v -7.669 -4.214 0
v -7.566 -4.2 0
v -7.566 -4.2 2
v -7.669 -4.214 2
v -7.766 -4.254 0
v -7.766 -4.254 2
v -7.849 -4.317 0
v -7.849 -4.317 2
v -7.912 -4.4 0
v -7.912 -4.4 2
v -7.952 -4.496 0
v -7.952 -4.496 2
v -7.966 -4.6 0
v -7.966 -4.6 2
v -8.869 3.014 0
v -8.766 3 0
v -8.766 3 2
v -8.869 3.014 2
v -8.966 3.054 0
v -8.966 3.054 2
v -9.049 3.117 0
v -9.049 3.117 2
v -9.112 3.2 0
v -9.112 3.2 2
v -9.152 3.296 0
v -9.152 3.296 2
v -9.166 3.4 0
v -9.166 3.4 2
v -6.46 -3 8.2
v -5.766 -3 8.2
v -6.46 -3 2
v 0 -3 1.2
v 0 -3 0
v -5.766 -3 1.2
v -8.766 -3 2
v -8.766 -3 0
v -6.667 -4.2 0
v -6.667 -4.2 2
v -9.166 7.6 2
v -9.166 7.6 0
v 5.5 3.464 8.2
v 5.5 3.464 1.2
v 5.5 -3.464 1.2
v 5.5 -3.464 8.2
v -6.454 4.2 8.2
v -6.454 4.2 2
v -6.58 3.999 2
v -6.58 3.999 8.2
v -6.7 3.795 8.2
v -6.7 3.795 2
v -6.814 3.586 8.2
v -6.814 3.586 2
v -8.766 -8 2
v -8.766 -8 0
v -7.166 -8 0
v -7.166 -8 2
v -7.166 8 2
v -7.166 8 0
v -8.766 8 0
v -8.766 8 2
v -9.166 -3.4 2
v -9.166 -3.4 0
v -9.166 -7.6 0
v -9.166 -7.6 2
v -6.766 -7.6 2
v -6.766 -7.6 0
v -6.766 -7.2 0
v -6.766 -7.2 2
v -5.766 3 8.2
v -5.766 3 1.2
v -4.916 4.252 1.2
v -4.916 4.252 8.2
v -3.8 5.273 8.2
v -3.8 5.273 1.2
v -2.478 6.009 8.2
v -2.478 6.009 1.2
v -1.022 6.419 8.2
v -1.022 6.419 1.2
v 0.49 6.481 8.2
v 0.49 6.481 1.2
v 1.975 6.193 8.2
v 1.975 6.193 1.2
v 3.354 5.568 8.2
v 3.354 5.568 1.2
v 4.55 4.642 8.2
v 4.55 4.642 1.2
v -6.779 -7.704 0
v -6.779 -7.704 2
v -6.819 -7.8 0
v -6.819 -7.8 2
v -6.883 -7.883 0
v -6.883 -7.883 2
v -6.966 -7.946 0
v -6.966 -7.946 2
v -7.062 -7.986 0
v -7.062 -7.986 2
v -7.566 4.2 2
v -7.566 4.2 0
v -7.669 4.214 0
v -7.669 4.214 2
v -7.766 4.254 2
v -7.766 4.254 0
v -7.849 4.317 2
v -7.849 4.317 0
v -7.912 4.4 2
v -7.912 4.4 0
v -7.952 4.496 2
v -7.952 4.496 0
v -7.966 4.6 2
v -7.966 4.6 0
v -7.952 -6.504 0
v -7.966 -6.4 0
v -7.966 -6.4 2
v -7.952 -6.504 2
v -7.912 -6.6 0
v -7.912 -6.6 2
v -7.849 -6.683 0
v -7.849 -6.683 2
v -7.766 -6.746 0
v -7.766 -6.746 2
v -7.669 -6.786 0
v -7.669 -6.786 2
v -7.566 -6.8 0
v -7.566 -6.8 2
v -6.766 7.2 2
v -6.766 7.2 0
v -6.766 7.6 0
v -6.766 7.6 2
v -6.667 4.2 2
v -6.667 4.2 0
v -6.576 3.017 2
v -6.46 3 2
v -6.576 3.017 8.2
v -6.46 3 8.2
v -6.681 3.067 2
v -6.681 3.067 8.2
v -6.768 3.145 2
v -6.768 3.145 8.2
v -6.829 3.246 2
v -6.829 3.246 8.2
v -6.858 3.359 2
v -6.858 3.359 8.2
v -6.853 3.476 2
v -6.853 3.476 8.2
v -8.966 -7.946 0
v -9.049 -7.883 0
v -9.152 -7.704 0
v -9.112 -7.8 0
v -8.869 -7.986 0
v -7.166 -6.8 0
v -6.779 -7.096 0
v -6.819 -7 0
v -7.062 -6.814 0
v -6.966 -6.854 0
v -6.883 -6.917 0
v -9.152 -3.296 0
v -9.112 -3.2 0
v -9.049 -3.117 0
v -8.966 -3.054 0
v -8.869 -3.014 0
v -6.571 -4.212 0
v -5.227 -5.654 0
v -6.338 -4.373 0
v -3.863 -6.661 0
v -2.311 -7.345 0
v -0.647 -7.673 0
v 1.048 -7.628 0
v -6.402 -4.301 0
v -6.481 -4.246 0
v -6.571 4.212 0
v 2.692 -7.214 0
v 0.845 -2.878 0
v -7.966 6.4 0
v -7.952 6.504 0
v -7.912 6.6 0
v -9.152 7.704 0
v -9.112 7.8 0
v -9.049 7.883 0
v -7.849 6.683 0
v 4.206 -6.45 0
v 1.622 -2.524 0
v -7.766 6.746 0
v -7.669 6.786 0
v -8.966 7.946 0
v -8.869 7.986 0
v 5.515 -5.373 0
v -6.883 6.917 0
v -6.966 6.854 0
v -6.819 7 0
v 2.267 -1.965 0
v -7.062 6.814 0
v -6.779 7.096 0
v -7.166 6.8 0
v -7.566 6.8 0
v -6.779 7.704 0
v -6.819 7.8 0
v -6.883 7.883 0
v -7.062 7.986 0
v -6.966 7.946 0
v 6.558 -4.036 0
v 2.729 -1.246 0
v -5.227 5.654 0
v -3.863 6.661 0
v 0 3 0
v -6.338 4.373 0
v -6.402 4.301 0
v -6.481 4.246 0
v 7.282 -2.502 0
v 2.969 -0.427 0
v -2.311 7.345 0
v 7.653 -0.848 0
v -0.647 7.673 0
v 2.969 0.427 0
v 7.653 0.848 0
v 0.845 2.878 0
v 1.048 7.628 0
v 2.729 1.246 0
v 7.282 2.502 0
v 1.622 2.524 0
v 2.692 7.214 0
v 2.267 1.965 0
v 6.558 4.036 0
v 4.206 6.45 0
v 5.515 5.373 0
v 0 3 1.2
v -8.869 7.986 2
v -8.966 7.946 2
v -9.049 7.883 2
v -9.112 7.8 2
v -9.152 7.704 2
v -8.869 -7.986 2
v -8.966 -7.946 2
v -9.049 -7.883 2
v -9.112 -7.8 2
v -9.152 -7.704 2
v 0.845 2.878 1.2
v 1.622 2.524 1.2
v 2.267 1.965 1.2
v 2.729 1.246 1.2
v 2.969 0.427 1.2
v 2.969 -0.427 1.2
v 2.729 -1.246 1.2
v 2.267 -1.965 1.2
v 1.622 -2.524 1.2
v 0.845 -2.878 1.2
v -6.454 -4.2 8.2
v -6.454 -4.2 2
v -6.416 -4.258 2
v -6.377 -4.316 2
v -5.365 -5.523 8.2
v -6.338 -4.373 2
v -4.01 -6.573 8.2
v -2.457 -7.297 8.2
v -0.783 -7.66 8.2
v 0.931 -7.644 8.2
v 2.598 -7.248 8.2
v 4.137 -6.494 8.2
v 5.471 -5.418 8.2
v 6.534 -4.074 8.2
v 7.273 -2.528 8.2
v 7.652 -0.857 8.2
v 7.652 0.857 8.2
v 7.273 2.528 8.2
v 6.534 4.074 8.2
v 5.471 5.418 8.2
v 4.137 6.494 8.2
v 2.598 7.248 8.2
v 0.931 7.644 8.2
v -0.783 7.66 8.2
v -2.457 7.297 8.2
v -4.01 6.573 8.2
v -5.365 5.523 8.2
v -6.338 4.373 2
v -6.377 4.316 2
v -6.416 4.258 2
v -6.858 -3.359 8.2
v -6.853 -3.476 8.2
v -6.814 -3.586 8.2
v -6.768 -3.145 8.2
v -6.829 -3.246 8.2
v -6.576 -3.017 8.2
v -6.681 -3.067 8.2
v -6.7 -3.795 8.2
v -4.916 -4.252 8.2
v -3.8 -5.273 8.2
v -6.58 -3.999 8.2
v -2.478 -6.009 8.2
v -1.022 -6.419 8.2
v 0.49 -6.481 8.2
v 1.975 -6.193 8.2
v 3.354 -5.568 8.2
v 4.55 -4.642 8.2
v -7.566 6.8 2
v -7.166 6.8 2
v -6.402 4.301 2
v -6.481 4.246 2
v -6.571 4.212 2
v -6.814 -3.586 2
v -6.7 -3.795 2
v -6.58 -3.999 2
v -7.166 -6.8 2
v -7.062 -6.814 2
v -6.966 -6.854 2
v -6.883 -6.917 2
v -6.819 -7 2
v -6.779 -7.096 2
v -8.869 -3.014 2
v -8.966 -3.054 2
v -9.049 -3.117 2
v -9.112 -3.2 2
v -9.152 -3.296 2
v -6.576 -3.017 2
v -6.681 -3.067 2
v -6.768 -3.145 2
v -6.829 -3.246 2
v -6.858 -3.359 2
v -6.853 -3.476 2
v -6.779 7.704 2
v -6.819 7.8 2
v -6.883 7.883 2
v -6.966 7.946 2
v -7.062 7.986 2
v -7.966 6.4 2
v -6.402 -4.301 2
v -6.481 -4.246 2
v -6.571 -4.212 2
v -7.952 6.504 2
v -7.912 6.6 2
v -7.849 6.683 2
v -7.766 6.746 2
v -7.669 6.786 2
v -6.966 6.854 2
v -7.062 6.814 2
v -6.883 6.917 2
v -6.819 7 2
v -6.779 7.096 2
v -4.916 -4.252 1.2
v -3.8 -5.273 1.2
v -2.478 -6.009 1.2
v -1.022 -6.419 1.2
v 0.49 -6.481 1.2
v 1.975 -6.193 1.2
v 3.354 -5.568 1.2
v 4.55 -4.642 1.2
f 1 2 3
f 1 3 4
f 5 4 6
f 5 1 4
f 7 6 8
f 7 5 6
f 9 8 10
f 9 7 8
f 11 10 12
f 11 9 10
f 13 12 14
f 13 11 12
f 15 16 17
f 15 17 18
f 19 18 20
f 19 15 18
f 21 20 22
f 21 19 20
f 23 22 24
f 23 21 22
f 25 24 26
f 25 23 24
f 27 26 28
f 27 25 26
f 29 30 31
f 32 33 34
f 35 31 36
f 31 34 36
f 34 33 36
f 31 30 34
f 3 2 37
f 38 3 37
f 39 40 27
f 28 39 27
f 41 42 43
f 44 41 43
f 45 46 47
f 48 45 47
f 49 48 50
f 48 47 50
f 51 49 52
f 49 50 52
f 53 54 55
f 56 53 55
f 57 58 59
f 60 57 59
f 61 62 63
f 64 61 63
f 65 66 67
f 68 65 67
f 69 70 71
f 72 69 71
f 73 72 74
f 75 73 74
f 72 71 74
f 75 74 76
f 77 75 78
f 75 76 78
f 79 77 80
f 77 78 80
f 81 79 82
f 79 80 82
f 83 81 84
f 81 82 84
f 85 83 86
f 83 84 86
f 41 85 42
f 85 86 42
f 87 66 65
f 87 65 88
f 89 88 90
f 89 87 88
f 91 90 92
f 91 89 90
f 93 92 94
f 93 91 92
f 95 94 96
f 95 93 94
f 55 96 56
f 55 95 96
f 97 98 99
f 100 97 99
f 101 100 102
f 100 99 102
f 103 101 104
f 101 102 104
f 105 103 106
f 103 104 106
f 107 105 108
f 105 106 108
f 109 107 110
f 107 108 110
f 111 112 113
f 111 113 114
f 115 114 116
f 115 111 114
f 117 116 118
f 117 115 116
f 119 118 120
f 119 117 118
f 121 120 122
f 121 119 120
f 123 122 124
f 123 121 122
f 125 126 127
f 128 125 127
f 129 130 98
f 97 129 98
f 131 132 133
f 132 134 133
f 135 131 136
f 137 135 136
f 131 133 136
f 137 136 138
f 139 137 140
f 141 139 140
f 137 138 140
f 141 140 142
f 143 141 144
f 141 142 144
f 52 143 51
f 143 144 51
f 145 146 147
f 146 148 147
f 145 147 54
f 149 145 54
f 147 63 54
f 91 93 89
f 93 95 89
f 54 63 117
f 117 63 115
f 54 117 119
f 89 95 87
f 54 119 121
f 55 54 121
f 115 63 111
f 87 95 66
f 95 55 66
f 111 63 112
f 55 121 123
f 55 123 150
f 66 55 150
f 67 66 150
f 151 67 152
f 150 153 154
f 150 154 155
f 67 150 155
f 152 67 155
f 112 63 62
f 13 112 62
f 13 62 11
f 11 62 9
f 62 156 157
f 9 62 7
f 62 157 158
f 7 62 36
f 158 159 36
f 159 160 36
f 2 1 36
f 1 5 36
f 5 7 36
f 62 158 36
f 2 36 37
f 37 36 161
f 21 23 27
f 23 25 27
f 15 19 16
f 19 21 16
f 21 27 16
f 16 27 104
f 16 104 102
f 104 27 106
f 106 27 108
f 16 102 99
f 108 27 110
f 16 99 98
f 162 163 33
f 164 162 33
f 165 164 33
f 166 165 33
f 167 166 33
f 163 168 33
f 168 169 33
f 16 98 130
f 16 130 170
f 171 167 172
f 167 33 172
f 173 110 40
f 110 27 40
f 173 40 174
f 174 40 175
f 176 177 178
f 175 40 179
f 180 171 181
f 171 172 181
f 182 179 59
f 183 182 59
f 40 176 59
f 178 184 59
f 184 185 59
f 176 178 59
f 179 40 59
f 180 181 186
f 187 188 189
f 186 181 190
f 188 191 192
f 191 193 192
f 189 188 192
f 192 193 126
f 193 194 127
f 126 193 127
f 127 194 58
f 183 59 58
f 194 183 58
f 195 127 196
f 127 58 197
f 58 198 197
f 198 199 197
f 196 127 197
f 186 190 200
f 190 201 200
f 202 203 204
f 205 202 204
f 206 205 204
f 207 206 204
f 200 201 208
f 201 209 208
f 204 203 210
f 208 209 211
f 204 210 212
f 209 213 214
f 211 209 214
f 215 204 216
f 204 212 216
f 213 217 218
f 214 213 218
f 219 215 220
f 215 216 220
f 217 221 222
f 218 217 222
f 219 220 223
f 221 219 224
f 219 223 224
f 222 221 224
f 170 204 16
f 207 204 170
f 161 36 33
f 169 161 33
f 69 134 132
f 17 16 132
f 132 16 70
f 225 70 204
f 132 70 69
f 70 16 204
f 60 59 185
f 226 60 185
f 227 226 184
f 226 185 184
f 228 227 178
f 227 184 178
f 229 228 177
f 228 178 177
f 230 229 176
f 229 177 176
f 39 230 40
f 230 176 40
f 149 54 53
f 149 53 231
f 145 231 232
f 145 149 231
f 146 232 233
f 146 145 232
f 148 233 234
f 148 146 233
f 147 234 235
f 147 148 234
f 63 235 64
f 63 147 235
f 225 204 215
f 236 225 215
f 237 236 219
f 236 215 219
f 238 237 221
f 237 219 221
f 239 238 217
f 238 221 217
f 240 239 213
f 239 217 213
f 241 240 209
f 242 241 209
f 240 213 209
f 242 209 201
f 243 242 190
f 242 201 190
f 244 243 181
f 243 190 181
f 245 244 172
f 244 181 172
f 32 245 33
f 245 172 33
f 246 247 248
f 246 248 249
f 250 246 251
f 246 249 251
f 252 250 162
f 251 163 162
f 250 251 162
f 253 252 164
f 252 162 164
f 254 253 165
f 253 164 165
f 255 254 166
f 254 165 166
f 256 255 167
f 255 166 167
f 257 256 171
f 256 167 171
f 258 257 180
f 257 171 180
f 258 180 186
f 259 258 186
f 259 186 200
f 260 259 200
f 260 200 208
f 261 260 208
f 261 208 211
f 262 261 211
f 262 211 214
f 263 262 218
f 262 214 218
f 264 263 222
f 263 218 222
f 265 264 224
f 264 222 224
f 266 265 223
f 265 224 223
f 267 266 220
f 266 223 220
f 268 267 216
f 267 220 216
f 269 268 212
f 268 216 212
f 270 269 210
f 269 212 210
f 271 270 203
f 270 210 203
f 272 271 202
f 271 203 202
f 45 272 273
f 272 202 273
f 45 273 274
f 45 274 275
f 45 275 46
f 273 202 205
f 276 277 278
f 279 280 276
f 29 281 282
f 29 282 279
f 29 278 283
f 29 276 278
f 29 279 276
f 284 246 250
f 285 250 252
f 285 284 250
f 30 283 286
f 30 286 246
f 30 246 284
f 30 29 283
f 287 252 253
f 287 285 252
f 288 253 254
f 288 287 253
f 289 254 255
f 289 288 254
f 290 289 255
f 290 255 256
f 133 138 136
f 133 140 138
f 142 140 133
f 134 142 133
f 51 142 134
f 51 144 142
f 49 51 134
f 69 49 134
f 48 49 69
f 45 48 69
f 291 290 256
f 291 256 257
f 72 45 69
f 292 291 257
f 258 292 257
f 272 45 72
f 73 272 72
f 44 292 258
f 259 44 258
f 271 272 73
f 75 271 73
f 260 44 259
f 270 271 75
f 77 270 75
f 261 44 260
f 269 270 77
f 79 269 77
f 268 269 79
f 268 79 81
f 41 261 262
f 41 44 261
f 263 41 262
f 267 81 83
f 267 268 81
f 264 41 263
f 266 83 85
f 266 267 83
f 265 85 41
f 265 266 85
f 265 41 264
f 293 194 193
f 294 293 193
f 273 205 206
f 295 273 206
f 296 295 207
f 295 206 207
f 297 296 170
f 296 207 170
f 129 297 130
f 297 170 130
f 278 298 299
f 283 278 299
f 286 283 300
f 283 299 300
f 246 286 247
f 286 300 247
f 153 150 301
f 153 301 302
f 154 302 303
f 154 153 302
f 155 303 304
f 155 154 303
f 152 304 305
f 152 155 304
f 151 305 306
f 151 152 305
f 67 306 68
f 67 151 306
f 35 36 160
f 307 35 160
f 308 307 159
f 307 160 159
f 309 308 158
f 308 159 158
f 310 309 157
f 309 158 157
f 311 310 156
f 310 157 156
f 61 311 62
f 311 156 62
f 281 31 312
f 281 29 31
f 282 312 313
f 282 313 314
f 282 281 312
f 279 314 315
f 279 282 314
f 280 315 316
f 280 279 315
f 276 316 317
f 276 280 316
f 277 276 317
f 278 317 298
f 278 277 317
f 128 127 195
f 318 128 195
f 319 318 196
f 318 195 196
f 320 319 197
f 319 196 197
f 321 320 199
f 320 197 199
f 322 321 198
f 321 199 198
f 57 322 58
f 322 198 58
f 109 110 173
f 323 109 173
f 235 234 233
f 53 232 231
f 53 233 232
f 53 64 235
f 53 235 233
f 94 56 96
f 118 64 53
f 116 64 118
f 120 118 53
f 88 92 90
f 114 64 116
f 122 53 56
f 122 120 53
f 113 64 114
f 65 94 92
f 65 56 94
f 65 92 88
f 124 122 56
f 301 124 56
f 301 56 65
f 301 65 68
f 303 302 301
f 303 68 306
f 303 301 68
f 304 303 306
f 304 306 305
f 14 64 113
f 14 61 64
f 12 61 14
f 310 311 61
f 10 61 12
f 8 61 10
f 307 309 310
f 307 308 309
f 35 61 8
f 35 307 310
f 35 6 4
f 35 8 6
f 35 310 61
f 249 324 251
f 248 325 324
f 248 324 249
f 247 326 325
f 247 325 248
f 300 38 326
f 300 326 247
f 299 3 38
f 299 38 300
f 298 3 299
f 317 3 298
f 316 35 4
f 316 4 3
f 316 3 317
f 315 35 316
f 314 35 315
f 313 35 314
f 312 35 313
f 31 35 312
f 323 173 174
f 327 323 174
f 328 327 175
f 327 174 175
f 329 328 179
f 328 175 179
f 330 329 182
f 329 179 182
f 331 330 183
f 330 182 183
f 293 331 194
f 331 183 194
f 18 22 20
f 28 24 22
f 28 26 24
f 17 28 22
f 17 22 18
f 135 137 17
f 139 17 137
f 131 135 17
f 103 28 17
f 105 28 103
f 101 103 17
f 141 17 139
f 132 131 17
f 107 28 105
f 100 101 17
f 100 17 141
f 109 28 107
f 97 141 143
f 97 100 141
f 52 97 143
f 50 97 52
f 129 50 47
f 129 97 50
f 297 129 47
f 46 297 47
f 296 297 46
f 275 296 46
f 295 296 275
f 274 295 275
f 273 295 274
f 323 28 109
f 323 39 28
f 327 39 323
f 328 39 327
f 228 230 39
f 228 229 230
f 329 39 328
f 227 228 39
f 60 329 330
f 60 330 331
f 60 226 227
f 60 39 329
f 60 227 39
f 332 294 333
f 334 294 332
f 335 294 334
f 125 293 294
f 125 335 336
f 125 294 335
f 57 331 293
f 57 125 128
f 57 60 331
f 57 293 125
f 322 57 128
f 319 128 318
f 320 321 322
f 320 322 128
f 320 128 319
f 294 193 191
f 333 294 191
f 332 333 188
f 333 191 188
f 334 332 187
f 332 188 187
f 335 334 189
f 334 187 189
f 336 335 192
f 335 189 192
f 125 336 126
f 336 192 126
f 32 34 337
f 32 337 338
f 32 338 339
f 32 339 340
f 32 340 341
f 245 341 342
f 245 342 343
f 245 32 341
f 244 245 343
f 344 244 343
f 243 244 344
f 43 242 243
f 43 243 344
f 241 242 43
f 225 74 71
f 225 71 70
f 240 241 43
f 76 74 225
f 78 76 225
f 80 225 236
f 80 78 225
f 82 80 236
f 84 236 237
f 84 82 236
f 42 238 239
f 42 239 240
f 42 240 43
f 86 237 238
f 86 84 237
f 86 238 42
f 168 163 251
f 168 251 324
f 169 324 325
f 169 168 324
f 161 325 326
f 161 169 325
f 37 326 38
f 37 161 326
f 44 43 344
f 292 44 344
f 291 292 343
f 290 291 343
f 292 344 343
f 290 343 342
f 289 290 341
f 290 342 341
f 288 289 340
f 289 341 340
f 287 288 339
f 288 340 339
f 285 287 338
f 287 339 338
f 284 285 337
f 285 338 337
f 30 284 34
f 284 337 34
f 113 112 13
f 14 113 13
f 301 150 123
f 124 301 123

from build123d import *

# Parameters (mm, degrees)
F1_DEPTH    = 8.2
F2_DEPTH    = 1.2
F3_DEPTH    = 2
F4_R        = 0.4
F5_T1_DEPTH = 2
F5_T3_DEPTH = 4


# Not quite as in the source:
# - a fillet or chamfer that OpenCascade refuses, or shapes differently, is made with other operations: its cross-section is extruded or revolved along the edge and cut away or added
# - a feature names something its author has since deleted; it is built from what else it names


with BuildPart() as f1:
    # F0 (on Top) → F1 (new body)
    with BuildSketch(Plane.XY):
        with BuildLine():
            Line((-5.7662812973, -3), (-7.0915442606, -3))
            ThreePointArc((-7.0915442606, -3), (-6.7991383758, -3.6140997975), (-6.4536811201, -4.2))
            ThreePointArc((-6.4536811201, -4.2), (7.7, 0), (-6.4536811201, 4.2))
            ThreePointArc((-6.4536811201, 4.2), (-6.7991383758, 3.6140997975), (-7.0915442606, 3))
            Line((-7.0915442606, 3), (-5.7662812973, 3))
            ThreePointArc((-5.7662812973, 3), (-0.2675331935, 6.4944919732), (5.5, 3.4641016151))
            ThreePointArc((5.5, 3.4641016151), (6.5, 0), (5.5, -3.4641016151))
            ThreePointArc((5.5, -3.4641016151), (-0.2675331935, -6.4944919732), (-5.7662812973, -3))
        make_face()
        with BuildLine():
            Line((5.5, 3.4641016151), (5.5, -3.4641016151))
            ThreePointArc((5.5, -3.4641016151), (6.5, 0), (5.5, 3.4641016151))
        make_face()
    extrude(amount=F1_DEPTH)

    # F0 (on Top) → F2 (join)
    with BuildSketch(Plane.XY):
        with BuildLine():
            Line((0, -3), (-5.7662812973, -3))
            ThreePointArc((-5.7662812973, -3), (-0.2675331935, -6.4944919732), (5.5, -3.4641016151))
            Line((5.5, -3.4641016151), (5.5, 3.4641016151))
            ThreePointArc((5.5, 3.4641016151), (-0.2675331935, 6.4944919732), (-5.7662812973, 3))
            Line((-5.7662812973, 3), (0, 3))
            ThreePointArc((0, 3), (3, 0), (0, -3))
        make_face()
        with BuildLine():
            Line((5.5, 3.4641016151), (5.5, -3.4641016151))
            ThreePointArc((5.5, -3.4641016151), (6.5, 0), (5.5, 3.4641016151))
        make_face()
    extrude(amount=F2_DEPTH)

    # F0 (on Top) → F3 (join)
    with BuildSketch(Plane.XY):
        with BuildLine():
            ThreePointArc((-7.0915442606, 3), (-6.7991383758, 3.6140997975), (-6.4536811201, 4.2))
            Line((-6.4536811201, 4.2), (-7.9657880694, 4.2))
            Line((-7.9657880694, 4.2), (-7.9657880694, 6.8))
            Line((-7.9657880694, 6.8), (-6.7657880694, 6.8))
            Line((-6.7657880694, 6.8), (-6.7657880694, 8))
            Line((-6.7657880694, 8), (-7.9657880694, 8))
            Line((-7.9657880694, 8), (-9.1657880694, 8))
            Line((-9.1657880694, 8), (-9.1657880694, 3))
            Line((-9.1657880694, 3), (-7.0915442606, 3))
        make_face()
        with BuildLine():
            ThreePointArc((-6.4536811201, -4.2), (-6.7991383758, -3.6140997975), (-7.0915442606, -3))
            Line((-7.0915442606, -3), (-9.1657880694, -3))
            Line((-9.1657880694, -3), (-9.1657880694, -8))
            Line((-9.1657880694, -8), (-7.9657880694, -8))
            Line((-7.9657880694, -8), (-6.7657880694, -8))
            Line((-6.7657880694, -8), (-6.7657880694, -6.8))
            Line((-6.7657880694, -6.8), (-7.9657880694, -6.8))
            Line((-7.9657880694, -6.8), (-7.9657880694, -4.2))
            Line((-7.9657880694, -4.2), (-6.4536811201, -4.2))
        make_face()
    extrude(amount=F3_DEPTH)

    # F4
    f4_edges = [f1.edges().sort_by_distance(p)[0] for p in [
        (-7.091544, 3, 5.1),
        (-7.091544, -3, 5.1),
    ]]
    fillet(f4_edges, radius=F4_R)

    # F5: fillet of radius 0.4 on 14 edges, made by hand

    # F5_s2 → F5_t1 (join)
    with BuildSketch(Plane.XY):
        with BuildLine():
            ThreePointArc((-7.5657880694, 4.2), (-7.8486307818, 4.3171572875), (-7.9657880694, 4.6))
            Line((-7.9657880694, 4.6), (-7.9657880694, 4.2))
            Line((-7.9657880694, 4.2), (-7.5657880694, 4.2))
        make_face()
        with BuildLine():
            ThreePointArc((-6.3378446378, 4.3728395062), (-6.48115887, 4.2458360567), (-6.6670833203, 4.2))
            Line((-6.6670833203, 4.2), (-6.4536811201, 4.2))
            ThreePointArc((-6.4536811201, 4.2), (-6.3963467056, 4.2868110318), (-6.3378446378, 4.3728395062))
        make_face()
        with BuildLine():
            ThreePointArc((-6.3378446378, -4.3728395062), (-6.48115887, -4.2458360567), (-6.6670833203, -4.2))
            Line((-6.6670833203, -4.2), (-6.4536811201, -4.2))
            ThreePointArc((-6.4536811201, -4.2), (-6.3963467056, -4.2868110318), (-6.3378446378, -4.3728395062))
        make_face()
        with BuildLine():
            ThreePointArc((-7.5657880694, -4.2), (-7.8486307818, -4.3171572875), (-7.9657880694, -4.6))
            Line((-7.9657880694, -4.6), (-7.9657880694, -4.2))
            Line((-7.9657880694, -4.2), (-7.5657880694, -4.2))
        make_face()
        with BuildLine():
            ThreePointArc((-7.9657880694, -6.4), (-7.8486307818, -6.6828427125), (-7.5657880694, -6.8))
            Line((-7.5657880694, -6.8), (-7.9657880694, -6.8))
            Line((-7.9657880694, -6.8), (-7.9657880694, -6.4))
        make_face()
        with BuildLine():
            ThreePointArc((-7.9657880694, 6.4), (-7.8486307818, 6.6828427125), (-7.5657880694, 6.8))
            Line((-7.5657880694, 6.8), (-7.9657880694, 6.8))
            Line((-7.9657880694, 6.8), (-7.9657880694, 6.4))
        make_face()
    extrude(amount=F5_T1_DEPTH)

    # F5_s4 → F5_t3 (cut)
    with BuildSketch(Plane.XY.offset(-1)):
        with BuildLine():
            ThreePointArc((-8.7657880694, -8), (-9.0486307818, -7.8828427125), (-9.1657880694, -7.6))
            Line((-9.1657880694, -7.6), (-9.1657880694, -8))
            Line((-9.1657880694, -8), (-8.7657880694, -8))
        make_face()
        with BuildLine():
            ThreePointArc((-8.7657880694, -3), (-9.0486307818, -3.1171572875), (-9.1657880694, -3.4))
            Line((-9.1657880694, -3.4), (-9.1657880694, -3))
            Line((-9.1657880694, -3), (-8.7657880694, -3))
        make_face()
        with BuildLine():
            ThreePointArc((-8.7657880694, 3), (-9.0486307818, 3.1171572875), (-9.1657880694, 3.4))
            Line((-9.1657880694, 3.4), (-9.1657880694, 3))
            Line((-9.1657880694, 3), (-8.7657880694, 3))
        make_face()
        with BuildLine():
            ThreePointArc((-8.7657880694, 8), (-9.0486307818, 7.8828427125), (-9.1657880694, 7.6))
            Line((-9.1657880694, 7.6), (-9.1657880694, 8))
            Line((-9.1657880694, 8), (-8.7657880694, 8))
        make_face()
        with BuildLine():
            ThreePointArc((-7.1657880694, 6.8), (-6.8829453569, 6.9171572875), (-6.7657880694, 7.2))
            Line((-6.7657880694, 7.2), (-6.7657880694, 6.8))
            Line((-6.7657880694, 6.8), (-7.1657880694, 6.8))
        make_face()
        with BuildLine():
            ThreePointArc((-6.7657880694, -7.6), (-6.8829453569, -7.8828427125), (-7.1657880694, -8))
            Line((-7.1657880694, -8), (-6.7657880694, -8))
            Line((-6.7657880694, -8), (-6.7657880694, -7.6))
        make_face()
        with BuildLine():
            ThreePointArc((-7.1657880694, -6.8), (-6.8829453569, -6.9171572875), (-6.7657880694, -7.2))
            Line((-6.7657880694, -7.2), (-6.7657880694, -6.8))
            Line((-6.7657880694, -6.8), (-7.1657880694, -6.8))
        make_face()
        with BuildLine():
            ThreePointArc((-6.7657880694, 7.6), (-6.8829453569, 7.8828427125), (-7.1657880694, 8))
            Line((-7.1657880694, 8), (-6.7657880694, 8))
            Line((-6.7657880694, 8), (-6.7657880694, 7.6))
        make_face()
    extrude(amount=F5_T3_DEPTH, mode=Mode.SUBTRACT)


solid = f1.part
